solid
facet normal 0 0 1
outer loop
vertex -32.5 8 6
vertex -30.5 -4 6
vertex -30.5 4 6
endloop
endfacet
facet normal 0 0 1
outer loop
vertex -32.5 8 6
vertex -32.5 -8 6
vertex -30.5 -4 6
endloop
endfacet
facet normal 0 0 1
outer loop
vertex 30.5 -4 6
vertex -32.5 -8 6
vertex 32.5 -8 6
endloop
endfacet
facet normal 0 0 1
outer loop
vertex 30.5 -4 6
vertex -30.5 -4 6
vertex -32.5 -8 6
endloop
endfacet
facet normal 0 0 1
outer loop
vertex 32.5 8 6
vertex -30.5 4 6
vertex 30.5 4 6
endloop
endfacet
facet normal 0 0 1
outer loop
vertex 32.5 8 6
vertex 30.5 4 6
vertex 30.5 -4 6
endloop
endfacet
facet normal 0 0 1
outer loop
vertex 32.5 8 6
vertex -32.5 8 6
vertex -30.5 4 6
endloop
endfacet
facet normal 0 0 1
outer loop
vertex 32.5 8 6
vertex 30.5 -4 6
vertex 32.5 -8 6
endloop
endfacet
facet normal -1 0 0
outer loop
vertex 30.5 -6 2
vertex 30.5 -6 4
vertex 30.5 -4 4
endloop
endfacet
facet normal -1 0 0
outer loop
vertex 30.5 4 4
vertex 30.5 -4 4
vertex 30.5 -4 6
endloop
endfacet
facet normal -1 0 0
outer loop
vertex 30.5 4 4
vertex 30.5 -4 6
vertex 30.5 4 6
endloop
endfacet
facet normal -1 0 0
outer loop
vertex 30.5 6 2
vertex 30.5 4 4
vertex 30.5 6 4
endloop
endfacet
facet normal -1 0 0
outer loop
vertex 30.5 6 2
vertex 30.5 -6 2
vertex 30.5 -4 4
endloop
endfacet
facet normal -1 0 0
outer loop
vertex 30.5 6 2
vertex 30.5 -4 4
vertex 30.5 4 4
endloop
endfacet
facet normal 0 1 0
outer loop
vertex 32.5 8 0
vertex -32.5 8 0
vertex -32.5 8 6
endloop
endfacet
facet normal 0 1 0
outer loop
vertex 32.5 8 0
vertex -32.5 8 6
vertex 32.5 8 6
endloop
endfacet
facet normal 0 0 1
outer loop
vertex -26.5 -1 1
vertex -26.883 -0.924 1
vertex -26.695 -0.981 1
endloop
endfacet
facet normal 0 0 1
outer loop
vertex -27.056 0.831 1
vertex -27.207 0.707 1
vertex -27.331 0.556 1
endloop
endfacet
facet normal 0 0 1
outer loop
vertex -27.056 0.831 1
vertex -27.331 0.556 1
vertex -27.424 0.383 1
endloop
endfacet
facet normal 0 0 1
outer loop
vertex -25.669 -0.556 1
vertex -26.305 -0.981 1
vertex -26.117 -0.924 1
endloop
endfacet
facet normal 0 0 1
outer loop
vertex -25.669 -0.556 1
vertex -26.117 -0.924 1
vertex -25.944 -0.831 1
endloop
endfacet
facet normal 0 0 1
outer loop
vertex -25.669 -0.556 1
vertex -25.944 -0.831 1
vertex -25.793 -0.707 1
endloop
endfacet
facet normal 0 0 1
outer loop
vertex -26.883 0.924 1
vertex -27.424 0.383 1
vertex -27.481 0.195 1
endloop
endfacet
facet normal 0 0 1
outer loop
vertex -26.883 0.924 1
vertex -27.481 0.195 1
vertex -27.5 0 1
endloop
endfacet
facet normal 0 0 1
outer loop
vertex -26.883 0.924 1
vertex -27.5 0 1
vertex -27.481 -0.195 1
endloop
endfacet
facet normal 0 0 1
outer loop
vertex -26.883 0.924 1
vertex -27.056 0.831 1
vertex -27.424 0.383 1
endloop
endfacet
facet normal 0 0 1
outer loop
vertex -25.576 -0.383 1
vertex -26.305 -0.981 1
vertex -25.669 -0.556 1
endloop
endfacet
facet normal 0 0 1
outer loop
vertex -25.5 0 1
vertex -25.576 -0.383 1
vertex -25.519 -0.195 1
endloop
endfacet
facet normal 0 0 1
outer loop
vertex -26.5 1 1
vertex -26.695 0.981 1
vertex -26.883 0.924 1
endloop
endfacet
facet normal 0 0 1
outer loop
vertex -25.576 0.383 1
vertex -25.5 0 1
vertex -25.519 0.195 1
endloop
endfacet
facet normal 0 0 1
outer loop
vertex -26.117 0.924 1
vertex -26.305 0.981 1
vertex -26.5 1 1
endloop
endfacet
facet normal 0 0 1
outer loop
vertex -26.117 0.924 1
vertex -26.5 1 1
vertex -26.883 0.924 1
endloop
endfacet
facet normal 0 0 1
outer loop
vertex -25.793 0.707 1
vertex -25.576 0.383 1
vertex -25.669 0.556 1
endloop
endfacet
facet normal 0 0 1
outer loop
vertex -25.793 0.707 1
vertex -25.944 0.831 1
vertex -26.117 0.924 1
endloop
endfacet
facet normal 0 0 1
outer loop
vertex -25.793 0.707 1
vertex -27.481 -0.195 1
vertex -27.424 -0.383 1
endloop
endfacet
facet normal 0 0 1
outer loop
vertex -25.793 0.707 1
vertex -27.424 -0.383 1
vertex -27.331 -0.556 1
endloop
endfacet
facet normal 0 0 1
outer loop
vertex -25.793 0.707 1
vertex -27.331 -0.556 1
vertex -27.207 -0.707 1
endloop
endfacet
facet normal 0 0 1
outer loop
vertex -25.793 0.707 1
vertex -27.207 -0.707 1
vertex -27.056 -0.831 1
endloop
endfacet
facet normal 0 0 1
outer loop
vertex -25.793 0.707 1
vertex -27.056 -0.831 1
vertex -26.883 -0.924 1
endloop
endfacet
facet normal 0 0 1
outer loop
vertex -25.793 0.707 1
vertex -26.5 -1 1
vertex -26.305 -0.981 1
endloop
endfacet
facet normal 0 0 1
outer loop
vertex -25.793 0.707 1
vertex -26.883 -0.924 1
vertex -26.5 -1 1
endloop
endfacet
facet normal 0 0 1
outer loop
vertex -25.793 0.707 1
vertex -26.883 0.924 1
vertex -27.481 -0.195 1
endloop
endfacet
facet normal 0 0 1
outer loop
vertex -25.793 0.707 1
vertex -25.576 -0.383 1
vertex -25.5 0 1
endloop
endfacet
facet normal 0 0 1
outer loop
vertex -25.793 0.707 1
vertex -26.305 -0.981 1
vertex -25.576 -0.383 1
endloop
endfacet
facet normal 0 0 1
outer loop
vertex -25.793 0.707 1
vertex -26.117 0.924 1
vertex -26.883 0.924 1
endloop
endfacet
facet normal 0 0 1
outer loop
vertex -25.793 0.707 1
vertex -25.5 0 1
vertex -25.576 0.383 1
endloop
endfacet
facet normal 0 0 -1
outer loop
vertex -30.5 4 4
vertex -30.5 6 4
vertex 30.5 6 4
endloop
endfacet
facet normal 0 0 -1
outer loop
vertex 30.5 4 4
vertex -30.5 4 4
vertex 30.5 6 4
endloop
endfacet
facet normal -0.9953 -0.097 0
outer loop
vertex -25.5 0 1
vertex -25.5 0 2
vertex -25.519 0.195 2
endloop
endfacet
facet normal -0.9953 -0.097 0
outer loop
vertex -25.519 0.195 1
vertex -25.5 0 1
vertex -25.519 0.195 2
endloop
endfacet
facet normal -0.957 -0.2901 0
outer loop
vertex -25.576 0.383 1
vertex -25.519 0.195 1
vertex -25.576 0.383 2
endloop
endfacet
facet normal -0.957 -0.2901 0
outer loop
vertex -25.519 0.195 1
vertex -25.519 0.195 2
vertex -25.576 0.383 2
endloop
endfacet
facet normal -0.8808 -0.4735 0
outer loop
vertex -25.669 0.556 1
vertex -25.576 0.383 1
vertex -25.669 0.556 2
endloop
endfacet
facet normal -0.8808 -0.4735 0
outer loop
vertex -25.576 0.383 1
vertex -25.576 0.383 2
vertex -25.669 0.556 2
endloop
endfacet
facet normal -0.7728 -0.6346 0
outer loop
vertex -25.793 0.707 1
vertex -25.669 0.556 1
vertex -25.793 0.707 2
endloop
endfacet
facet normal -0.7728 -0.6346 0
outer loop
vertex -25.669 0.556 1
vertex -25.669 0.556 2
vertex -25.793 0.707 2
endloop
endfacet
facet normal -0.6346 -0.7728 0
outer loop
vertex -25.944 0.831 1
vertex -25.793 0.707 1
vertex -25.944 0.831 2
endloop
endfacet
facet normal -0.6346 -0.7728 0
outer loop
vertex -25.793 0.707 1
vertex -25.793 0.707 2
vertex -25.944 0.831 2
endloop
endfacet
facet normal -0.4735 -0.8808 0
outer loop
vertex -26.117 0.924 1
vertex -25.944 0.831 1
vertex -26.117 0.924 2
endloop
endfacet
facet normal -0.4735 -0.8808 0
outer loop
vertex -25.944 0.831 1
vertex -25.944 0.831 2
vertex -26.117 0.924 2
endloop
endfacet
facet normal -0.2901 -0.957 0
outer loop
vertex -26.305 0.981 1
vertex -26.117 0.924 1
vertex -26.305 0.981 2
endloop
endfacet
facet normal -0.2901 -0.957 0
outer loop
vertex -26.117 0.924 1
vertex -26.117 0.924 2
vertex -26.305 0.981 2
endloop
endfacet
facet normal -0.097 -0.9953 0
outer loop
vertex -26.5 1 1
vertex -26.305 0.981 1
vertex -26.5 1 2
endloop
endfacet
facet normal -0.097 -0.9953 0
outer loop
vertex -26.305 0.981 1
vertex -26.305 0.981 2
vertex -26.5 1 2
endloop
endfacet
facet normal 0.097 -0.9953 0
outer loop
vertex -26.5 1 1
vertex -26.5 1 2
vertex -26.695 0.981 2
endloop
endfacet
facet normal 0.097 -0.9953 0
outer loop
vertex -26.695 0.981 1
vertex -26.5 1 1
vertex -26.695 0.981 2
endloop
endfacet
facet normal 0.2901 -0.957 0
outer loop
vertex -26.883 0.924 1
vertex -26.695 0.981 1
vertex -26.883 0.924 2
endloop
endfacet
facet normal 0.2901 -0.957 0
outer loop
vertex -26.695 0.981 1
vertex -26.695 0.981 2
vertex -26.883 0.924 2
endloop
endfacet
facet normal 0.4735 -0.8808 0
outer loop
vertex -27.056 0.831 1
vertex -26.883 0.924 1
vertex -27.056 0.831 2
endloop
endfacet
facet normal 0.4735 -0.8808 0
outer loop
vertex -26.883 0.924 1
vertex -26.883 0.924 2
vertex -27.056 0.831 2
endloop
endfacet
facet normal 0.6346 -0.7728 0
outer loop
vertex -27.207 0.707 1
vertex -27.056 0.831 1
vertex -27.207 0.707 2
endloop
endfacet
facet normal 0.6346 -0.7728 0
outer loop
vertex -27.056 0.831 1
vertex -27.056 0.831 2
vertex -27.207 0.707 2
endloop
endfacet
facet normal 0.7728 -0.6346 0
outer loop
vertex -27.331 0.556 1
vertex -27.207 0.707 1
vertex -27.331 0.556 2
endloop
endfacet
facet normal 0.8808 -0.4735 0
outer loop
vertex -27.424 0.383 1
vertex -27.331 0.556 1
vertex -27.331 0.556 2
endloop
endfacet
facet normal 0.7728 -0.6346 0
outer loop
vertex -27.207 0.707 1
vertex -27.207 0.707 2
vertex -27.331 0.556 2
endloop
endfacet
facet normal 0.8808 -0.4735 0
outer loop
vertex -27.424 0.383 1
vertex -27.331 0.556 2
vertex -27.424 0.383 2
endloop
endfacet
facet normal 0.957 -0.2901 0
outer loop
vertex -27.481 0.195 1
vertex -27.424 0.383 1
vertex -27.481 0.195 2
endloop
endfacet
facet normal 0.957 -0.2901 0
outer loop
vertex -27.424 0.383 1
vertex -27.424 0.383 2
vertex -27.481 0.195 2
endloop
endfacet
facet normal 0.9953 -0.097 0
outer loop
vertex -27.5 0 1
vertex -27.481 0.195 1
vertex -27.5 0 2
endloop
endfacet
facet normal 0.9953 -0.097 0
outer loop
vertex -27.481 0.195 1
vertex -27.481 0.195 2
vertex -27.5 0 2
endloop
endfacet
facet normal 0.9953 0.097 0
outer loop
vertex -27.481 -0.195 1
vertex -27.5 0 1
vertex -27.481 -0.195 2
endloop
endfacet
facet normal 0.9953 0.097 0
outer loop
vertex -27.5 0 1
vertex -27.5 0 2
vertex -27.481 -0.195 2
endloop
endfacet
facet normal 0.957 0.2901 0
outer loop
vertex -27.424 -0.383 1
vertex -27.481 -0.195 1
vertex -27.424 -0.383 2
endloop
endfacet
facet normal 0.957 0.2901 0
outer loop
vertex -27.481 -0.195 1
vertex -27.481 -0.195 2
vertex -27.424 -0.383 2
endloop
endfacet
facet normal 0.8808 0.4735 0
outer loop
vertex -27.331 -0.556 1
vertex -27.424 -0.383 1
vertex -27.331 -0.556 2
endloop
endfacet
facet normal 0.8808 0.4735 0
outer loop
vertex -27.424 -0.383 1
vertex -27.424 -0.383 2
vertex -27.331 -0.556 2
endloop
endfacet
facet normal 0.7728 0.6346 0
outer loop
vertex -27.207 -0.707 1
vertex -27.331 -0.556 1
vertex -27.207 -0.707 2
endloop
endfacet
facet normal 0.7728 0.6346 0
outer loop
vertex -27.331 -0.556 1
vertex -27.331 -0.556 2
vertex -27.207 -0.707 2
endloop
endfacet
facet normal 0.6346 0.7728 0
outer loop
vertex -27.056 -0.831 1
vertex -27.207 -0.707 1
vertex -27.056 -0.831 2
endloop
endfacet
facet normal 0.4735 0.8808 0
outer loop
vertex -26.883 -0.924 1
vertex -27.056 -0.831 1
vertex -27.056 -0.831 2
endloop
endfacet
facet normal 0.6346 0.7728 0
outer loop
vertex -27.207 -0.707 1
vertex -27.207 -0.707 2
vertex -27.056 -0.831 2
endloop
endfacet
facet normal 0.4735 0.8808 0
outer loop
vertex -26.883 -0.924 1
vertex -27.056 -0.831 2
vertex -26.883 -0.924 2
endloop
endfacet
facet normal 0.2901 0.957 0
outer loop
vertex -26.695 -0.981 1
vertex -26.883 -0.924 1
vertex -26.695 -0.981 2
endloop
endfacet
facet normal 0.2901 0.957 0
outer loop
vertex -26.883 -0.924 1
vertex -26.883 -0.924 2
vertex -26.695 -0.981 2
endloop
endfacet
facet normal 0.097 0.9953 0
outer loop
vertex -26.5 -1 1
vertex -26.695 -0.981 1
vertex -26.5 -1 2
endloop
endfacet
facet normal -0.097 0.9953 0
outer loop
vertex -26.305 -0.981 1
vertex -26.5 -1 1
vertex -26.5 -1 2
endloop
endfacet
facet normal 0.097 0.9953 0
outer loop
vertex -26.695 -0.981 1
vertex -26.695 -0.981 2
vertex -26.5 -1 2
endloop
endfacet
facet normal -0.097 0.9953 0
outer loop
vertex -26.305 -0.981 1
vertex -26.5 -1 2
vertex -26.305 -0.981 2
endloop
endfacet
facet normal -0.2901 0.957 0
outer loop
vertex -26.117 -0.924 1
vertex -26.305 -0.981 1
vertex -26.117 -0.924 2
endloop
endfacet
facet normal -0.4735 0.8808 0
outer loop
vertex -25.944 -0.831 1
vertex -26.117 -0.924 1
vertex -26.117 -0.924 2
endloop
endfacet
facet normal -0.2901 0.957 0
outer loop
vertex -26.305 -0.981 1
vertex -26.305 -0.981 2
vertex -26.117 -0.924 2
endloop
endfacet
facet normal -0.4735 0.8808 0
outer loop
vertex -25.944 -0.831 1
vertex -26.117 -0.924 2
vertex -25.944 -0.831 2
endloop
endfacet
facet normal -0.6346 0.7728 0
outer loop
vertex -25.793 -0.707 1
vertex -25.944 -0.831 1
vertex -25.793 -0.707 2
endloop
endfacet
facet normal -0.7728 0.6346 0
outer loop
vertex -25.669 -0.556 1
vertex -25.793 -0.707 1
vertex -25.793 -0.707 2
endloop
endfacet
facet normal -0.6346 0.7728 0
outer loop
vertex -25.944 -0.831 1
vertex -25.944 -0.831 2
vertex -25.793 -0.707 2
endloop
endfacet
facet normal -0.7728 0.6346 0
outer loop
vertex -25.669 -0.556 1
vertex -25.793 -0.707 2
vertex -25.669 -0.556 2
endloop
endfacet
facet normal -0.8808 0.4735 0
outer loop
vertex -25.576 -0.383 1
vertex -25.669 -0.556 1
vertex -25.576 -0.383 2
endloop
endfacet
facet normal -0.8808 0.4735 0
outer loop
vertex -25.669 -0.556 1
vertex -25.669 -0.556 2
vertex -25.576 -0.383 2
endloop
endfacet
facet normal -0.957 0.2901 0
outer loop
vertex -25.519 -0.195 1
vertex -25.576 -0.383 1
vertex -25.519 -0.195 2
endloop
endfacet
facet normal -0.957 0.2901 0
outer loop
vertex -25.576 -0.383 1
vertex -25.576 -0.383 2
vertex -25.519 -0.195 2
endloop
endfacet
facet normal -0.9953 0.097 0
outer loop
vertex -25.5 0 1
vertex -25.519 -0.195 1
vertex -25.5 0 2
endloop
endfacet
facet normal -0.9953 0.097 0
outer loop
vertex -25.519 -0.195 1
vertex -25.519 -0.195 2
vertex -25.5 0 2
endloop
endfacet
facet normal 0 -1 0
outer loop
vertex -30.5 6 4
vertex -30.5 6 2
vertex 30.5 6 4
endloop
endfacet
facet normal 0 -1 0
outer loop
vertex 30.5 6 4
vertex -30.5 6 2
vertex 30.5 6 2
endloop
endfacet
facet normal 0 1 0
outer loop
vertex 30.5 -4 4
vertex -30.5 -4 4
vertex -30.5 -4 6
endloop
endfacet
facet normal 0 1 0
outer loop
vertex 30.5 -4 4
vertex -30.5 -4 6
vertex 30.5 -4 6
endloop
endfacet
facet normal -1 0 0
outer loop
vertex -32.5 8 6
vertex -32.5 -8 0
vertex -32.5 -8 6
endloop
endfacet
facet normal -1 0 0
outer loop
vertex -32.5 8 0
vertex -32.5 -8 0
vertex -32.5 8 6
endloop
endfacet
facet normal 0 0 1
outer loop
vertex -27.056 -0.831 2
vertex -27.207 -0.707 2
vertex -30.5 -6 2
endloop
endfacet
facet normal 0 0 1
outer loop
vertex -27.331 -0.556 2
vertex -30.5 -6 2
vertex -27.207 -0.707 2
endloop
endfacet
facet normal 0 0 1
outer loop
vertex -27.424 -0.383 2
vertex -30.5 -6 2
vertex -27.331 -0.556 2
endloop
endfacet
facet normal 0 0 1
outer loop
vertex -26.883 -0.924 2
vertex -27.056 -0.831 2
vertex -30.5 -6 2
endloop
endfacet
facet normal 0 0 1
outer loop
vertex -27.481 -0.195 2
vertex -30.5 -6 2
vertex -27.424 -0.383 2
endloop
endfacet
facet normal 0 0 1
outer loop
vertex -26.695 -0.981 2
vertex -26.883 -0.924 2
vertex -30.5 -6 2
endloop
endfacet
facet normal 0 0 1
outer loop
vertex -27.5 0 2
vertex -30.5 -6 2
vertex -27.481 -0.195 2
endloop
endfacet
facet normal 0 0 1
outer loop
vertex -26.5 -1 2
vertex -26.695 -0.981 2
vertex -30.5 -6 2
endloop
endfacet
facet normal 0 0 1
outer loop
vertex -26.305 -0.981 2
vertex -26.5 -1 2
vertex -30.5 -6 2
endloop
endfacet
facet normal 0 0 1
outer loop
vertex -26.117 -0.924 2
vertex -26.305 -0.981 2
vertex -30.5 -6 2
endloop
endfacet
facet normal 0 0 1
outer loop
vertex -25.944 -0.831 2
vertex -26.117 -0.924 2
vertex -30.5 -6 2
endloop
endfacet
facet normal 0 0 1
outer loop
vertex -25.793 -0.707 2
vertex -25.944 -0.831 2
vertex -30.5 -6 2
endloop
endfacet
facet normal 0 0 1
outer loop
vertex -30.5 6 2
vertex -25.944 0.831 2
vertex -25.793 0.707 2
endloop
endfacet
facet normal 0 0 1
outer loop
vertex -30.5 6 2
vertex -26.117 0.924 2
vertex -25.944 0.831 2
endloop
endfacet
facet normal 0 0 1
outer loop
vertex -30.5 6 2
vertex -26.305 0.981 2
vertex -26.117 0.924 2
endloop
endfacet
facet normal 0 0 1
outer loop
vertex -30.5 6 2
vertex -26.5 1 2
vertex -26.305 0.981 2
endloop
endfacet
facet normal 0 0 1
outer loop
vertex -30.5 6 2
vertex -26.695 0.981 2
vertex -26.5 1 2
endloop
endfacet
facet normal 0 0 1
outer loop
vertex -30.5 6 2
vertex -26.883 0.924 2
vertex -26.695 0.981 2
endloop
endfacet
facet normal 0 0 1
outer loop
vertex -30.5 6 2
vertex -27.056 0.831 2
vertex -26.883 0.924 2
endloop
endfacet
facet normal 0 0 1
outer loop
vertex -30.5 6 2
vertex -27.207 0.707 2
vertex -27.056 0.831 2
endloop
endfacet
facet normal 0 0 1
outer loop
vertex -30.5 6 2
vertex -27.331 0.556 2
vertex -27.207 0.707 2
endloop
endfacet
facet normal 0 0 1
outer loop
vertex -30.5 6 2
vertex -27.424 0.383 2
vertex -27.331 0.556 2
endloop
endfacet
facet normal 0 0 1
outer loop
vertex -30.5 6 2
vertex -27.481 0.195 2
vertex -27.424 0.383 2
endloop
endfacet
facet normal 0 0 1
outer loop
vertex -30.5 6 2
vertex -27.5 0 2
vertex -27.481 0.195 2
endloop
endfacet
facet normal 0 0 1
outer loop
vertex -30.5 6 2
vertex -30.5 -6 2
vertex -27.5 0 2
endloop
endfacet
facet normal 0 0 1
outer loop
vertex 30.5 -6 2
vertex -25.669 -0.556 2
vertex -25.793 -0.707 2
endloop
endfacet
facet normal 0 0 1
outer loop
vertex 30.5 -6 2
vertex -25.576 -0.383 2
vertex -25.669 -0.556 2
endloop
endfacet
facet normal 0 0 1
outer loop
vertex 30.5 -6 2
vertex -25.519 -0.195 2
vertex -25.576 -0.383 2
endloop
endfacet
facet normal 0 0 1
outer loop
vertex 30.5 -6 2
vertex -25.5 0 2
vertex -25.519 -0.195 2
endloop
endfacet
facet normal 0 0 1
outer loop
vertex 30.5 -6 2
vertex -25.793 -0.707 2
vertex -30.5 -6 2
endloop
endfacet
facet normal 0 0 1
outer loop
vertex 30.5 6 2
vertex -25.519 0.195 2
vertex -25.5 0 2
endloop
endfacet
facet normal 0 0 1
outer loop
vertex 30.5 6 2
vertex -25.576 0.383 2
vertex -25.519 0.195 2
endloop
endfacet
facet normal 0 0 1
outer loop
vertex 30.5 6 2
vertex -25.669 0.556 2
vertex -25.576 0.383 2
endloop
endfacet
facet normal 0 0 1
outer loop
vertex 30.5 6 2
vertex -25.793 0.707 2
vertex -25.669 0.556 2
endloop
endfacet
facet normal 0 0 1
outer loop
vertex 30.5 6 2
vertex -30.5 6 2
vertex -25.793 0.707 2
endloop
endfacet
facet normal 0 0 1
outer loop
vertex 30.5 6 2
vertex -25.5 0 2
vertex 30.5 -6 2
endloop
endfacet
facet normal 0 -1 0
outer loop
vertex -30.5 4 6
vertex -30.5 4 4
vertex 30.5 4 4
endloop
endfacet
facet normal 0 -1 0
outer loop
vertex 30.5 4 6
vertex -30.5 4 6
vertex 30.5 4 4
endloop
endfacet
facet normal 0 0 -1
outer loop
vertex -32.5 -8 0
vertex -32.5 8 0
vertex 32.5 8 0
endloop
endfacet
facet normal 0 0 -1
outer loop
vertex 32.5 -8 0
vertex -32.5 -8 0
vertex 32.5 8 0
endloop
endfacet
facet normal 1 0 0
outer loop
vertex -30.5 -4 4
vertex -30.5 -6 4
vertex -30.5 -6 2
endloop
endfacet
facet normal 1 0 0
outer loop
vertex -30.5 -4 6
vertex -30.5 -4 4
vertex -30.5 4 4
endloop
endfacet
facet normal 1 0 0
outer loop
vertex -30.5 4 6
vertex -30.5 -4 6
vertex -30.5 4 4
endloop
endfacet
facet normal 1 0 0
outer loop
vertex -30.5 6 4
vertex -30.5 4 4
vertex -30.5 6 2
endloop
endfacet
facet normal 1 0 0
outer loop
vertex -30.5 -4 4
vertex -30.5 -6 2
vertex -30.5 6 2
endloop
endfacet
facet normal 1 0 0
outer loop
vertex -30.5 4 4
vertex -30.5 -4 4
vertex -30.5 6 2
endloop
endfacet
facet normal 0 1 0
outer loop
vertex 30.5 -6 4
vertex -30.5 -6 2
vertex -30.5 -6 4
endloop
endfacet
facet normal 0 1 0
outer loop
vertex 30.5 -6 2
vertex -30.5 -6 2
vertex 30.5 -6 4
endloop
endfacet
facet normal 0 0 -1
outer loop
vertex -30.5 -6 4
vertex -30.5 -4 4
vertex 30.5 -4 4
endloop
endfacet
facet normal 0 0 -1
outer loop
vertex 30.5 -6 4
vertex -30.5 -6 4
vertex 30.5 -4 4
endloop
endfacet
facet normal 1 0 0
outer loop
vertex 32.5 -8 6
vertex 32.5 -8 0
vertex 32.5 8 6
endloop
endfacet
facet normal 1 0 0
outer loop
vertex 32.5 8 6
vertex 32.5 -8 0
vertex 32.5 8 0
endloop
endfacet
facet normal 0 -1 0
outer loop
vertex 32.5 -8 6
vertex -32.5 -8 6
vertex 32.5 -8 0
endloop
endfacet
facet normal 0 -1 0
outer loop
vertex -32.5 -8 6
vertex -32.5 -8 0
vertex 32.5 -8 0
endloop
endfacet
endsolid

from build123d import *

# Parameters (mm, degrees)
SKETCH1_W           = 65
SKETCH1_H           = 16
BOSS_EXTRUDE1_DEPTH = 2
SKETCH2_W           = 65
SKETCH2_H           = 16
SKETCH2_W_2         = 61
SKETCH2_H_2         = 12
BOSS_EXTRUDE2_DEPTH = 2
SKETCH4_W           = 65
SKETCH4_H           = 16
SKETCH4_W_2         = 61
SKETCH4_H_2         = 8
BOSS_EXTRUDE3_DEPTH = 2
SKETCH5_R           = 1
CUT_EXTRUDE1_DEPTH  = 1


with BuildPart() as part:
    # Sketch1 → Boss-Extrude1 (new body)
    with BuildSketch(Plane.XY):
        Rectangle(SKETCH1_W, SKETCH1_H)
    extrude(amount=BOSS_EXTRUDE1_DEPTH)

    # Sketch2 → Boss-Extrude2 (add)
    with BuildSketch(Plane.XY.offset(2)):
        Rectangle(SKETCH2_W, SKETCH2_H)
        Rectangle(SKETCH2_W_2, SKETCH2_H_2, mode=Mode.SUBTRACT)
    extrude(amount=BOSS_EXTRUDE2_DEPTH)

    # Sketch4 → Boss-Extrude3 (add)
    with BuildSketch(Plane.XY.offset(4)):
        Rectangle(SKETCH4_W, SKETCH4_H)
        Rectangle(SKETCH4_W_2, SKETCH4_H_2, mode=Mode.SUBTRACT)
    extrude(amount=BOSS_EXTRUDE3_DEPTH)

    # Sketch5 → Cut-Extrude1 (cut)
    with BuildSketch(Plane.XY.offset(2)):
        with Locations((-26.5, 0)):
            Circle(SKETCH5_R)
    extrude(amount=-CUT_EXTRUDE1_DEPTH, mode=Mode.SUBTRACT)


solid = part.part
